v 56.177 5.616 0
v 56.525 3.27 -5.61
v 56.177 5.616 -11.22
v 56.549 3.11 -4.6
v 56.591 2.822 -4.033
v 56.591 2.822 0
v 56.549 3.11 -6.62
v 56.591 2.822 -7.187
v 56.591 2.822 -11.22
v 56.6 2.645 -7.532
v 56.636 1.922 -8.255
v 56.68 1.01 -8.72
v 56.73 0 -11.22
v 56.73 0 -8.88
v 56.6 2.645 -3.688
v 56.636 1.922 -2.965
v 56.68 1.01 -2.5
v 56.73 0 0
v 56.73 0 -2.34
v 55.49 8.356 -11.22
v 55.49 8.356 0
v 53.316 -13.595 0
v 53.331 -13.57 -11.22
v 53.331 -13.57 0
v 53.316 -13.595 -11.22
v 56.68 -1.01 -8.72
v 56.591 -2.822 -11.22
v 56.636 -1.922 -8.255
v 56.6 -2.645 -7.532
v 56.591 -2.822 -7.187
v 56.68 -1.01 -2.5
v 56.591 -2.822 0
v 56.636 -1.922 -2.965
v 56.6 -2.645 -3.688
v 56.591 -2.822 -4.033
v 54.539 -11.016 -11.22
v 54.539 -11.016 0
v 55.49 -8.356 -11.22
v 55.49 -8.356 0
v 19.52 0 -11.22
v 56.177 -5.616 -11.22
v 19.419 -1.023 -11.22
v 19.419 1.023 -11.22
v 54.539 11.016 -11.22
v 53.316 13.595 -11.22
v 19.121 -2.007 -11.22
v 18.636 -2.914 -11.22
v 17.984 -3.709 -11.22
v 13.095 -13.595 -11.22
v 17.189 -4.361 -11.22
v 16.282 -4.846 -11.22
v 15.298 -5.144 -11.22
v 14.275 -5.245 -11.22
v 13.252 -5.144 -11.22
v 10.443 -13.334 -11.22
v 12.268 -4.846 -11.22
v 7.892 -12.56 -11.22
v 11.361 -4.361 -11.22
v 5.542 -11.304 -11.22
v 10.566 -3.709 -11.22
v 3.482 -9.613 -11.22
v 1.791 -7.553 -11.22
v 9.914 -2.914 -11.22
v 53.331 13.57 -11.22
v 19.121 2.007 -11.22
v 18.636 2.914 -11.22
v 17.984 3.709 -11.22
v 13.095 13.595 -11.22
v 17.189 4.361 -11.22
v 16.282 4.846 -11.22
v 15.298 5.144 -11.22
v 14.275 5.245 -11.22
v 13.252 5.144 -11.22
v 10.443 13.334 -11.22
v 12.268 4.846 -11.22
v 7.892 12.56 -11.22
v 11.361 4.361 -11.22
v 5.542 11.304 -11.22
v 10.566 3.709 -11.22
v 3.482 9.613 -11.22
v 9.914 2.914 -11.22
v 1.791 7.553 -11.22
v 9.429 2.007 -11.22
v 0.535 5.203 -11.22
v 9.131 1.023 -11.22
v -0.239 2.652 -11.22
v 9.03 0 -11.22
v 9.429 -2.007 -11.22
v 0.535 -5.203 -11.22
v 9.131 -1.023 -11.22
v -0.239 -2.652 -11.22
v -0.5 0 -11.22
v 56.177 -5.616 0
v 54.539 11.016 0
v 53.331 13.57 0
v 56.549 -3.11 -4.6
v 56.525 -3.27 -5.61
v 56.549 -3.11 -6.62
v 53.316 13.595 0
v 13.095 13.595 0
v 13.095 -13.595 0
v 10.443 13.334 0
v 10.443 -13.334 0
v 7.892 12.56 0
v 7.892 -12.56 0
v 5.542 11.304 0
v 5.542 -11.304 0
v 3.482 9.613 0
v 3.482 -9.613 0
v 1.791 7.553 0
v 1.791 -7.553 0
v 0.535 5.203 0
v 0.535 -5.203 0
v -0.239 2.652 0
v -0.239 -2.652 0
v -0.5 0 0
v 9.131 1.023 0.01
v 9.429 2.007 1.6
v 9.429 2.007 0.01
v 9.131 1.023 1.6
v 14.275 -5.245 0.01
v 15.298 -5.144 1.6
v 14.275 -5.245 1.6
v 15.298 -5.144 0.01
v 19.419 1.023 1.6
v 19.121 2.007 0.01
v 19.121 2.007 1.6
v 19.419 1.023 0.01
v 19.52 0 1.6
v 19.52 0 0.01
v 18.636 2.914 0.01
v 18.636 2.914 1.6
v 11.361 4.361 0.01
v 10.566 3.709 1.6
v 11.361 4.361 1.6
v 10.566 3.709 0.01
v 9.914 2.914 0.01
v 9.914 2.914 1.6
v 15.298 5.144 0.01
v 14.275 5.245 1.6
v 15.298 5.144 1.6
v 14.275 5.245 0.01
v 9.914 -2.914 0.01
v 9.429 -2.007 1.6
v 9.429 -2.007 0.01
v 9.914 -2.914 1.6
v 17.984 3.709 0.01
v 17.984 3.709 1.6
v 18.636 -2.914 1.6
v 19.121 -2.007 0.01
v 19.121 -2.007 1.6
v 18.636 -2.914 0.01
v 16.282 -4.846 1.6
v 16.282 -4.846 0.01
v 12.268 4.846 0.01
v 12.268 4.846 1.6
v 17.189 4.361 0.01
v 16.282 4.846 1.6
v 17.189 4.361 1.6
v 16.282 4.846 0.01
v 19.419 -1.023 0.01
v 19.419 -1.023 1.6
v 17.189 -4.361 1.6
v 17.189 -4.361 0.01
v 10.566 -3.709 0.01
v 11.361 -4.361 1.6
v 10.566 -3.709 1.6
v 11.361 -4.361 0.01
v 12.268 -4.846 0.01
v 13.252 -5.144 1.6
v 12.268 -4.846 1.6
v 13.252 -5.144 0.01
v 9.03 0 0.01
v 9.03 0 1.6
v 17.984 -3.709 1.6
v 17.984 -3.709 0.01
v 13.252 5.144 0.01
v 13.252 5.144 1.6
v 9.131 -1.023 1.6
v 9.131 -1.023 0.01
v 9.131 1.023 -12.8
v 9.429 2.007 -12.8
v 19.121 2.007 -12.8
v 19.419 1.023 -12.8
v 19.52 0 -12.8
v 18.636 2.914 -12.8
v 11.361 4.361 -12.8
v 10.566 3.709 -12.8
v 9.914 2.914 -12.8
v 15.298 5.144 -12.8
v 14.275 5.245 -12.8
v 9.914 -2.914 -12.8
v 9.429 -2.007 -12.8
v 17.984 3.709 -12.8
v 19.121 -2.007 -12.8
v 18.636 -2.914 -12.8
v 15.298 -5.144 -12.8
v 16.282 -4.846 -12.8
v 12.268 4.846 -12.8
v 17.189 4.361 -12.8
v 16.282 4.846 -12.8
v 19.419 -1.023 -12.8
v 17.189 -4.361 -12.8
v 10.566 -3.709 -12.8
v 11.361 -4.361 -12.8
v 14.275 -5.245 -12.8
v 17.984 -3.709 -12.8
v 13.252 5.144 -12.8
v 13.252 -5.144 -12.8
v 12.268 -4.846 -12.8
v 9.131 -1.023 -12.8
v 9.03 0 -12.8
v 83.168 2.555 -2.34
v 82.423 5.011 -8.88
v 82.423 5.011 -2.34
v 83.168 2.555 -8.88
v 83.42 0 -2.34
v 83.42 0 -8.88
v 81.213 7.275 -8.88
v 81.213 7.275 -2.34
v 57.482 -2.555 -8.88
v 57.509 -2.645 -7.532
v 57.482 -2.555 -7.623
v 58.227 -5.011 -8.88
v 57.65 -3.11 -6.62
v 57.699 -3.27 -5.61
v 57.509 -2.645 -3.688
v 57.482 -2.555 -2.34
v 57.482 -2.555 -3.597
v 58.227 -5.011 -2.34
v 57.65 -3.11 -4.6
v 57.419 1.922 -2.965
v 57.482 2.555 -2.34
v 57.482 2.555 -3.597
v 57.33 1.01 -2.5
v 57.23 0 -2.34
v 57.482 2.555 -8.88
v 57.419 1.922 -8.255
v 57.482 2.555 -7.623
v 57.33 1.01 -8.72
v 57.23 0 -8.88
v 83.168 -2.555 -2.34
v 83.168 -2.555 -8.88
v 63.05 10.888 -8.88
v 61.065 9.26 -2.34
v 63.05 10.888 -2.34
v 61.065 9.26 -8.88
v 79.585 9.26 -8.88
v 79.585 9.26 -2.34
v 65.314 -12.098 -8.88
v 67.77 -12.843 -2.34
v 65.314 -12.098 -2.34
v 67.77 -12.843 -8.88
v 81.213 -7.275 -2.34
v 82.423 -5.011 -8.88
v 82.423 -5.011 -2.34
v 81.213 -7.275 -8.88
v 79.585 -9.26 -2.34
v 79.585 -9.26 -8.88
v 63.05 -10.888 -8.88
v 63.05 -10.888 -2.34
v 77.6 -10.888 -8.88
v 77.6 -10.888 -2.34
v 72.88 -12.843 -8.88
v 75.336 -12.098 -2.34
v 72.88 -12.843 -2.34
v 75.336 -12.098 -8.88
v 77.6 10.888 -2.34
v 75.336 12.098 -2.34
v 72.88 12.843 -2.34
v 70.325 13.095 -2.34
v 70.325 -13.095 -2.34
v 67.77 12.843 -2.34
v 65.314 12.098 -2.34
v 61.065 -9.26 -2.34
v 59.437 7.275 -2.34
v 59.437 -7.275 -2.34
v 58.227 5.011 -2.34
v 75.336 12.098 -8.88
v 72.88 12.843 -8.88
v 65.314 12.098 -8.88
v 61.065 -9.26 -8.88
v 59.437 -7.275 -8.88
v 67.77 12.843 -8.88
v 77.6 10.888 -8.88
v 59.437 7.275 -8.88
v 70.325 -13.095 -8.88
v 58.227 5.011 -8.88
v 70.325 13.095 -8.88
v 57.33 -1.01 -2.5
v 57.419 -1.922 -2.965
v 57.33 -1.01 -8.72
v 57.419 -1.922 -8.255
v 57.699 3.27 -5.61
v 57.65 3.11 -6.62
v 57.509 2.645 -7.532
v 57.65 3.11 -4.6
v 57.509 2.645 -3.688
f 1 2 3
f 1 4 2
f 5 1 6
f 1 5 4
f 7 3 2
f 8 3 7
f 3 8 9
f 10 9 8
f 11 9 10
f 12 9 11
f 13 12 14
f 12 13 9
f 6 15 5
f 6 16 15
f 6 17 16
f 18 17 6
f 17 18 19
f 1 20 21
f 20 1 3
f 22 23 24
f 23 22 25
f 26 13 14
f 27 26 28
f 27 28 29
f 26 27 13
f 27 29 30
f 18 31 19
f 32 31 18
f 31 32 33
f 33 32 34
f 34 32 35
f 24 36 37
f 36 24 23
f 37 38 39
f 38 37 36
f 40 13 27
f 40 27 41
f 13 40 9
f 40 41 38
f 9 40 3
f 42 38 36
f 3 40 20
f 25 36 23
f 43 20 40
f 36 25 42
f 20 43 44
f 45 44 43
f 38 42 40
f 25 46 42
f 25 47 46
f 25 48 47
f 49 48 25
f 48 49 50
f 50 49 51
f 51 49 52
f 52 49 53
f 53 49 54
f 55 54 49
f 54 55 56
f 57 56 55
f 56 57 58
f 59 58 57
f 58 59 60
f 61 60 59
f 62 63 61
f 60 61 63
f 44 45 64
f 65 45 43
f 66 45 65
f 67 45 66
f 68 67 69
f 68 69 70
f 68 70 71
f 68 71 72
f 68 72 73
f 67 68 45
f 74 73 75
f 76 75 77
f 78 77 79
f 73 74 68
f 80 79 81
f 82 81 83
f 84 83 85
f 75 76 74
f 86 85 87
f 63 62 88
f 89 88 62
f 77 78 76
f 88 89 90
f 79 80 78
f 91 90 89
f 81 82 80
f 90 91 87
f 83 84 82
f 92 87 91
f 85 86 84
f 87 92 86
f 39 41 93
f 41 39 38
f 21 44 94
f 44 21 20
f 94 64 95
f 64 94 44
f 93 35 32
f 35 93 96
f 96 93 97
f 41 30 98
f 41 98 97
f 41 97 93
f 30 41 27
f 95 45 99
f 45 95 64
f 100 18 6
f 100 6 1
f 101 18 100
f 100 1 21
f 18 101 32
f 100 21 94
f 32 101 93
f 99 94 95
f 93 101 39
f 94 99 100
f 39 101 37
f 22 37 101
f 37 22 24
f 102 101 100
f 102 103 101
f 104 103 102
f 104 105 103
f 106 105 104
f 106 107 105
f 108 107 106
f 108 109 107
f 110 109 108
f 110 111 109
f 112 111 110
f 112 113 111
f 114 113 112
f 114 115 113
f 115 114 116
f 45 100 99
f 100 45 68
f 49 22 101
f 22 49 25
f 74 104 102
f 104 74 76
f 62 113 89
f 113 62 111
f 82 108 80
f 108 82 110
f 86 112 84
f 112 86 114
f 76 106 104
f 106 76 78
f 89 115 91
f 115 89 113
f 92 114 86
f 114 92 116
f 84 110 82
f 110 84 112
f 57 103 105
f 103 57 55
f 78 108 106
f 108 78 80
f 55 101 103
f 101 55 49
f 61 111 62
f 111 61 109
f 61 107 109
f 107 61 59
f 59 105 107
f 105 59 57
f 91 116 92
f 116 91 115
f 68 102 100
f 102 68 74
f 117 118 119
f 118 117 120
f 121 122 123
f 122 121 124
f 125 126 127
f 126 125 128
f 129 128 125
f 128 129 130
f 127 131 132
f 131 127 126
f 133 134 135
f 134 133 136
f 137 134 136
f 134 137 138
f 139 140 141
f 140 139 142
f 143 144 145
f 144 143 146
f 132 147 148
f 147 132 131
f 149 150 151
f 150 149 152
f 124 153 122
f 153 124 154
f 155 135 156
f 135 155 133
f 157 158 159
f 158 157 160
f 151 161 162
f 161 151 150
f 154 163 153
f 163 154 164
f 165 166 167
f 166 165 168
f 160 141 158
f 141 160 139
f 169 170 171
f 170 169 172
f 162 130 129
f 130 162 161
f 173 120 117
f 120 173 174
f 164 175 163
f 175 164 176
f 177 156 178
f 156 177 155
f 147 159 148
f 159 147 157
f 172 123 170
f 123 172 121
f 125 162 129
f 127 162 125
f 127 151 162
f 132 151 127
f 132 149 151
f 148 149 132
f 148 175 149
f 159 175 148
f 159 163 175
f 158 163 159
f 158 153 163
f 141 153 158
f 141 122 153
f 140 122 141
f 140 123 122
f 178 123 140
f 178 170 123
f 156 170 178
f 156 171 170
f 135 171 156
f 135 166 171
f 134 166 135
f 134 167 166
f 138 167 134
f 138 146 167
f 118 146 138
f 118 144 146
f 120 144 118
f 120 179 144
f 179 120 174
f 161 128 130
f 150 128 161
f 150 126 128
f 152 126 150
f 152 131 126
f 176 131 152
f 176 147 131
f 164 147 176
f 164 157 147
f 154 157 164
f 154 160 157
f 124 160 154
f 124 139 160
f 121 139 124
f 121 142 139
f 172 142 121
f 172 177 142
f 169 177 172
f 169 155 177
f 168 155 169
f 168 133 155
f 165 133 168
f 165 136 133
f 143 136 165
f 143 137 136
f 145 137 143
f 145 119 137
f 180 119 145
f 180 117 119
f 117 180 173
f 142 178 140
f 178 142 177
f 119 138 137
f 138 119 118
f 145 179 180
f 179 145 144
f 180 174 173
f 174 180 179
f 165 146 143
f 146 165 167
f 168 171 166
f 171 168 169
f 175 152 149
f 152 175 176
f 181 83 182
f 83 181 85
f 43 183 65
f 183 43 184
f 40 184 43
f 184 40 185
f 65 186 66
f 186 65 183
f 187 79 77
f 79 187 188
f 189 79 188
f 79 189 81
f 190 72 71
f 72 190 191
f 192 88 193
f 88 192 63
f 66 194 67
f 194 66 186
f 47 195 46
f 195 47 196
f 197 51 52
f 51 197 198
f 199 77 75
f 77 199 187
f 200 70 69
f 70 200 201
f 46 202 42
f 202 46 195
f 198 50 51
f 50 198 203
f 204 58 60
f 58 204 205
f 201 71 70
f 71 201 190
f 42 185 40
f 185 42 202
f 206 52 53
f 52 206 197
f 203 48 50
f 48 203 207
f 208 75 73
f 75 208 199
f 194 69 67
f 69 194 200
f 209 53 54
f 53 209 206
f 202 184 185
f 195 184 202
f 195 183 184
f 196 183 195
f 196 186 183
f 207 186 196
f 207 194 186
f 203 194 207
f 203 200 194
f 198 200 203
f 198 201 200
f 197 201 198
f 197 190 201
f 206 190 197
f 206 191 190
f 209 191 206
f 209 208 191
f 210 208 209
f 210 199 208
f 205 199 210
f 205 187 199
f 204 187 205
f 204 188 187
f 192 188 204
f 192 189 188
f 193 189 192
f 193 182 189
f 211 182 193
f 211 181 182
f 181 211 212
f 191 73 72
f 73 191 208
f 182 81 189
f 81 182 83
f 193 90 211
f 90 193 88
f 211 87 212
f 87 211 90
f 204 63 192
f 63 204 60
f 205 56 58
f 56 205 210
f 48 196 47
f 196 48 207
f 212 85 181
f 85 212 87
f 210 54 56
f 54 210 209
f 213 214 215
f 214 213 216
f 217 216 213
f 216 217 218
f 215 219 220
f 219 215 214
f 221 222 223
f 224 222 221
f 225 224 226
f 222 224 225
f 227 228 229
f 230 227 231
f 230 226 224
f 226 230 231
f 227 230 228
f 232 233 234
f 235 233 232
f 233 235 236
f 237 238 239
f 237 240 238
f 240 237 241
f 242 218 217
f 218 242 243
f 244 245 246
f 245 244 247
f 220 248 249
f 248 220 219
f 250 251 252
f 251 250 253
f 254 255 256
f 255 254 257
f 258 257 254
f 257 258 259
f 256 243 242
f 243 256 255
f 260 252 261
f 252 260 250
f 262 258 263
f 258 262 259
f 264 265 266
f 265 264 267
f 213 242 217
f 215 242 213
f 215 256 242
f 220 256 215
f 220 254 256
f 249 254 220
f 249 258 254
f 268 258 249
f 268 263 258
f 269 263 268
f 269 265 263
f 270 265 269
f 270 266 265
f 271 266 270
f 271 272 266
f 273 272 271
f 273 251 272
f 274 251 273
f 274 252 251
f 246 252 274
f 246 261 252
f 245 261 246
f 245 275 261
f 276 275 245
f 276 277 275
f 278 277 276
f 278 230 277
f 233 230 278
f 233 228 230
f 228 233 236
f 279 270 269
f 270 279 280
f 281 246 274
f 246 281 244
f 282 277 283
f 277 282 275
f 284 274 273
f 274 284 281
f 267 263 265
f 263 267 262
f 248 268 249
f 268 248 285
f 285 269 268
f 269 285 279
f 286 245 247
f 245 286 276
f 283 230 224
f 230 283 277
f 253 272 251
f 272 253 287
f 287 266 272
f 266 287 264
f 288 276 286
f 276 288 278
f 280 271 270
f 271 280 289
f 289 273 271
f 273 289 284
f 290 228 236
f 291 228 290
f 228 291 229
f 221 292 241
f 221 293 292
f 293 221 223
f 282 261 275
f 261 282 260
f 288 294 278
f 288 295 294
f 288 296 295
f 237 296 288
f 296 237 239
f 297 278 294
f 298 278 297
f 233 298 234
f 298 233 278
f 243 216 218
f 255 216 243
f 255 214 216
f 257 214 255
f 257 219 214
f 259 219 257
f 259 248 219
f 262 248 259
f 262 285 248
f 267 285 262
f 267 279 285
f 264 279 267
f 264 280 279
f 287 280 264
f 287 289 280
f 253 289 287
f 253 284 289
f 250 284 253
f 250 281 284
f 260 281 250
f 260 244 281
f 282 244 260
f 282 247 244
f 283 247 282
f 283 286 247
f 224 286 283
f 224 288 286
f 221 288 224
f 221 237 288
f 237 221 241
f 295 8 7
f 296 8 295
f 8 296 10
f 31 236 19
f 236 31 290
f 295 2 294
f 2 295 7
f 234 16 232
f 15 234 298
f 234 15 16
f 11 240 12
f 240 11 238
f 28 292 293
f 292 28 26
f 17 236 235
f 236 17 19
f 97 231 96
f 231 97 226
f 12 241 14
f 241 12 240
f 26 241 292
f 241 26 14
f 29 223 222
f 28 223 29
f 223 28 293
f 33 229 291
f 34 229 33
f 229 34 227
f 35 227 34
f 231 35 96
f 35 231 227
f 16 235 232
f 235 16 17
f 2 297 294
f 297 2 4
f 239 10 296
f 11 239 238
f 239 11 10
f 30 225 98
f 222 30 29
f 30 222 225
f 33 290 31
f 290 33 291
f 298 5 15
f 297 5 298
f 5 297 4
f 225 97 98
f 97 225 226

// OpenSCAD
// This is a stand-in for the Blizzard Software (digipass) authenticator
// Licensed under Creative Commons: Attribution, Share-Alike
//
// For attribution you can direct people to the original file on thingiverse:
// 		http://www.thingiverse.com/thing:593551

// ================ variables

//CUSTOMIZER VARIABLES

/* [main] */

// This is used to cut holes for the LCD and button (like if you're making a "skin")
holes=0;  // [0:"false",1:"true"]

// How far the holes above extend
hole_d=20;

/* [ overall dimensions ] */

// Total height
h=26.19;

// Total width (less any keychain stuff)
w=56.23;

// Total depth
d=10.22;

// make the authenticator this much larger in all directions
// (when making a box for an authenticator, set to like 1mm or something)
oversize=1;

// How far the chord side (keyring side) extends beyond a straight rectangle
chord_w=7.7;

/* [ keychain settings] */

// Whether to cut a hole for a keyring to attach (probably always want this =true)
keyring_hole=1;  // [0:"false",1:"true"]

// Extend the keyring forward or back to make a channel for inserting it
project_keyring=10;

// How big around the keychain post is
keychain_dia=6.54;

// How far the keychain post extends beyond the authentictor body
keychain_outset=2.0;

/* [ button options ] */

// How high the button sticks up
button_d=0.59;

// How big around the button is
button_dia=9.49;

// How far the center of the button is from the button end of the device
button_inset=14.275;

// used to make cut holes for buttons on both sides in case you put it in upside down
two_buttons=1; // [0:"false",1:"true"]

/* [ LCD screen ] */

// How wide the screen is (only used if holes=true)
lcd_w=22.62;

// How high the screen is (only used if holes=true)
lcd_h=7.54;

// How far the nearest edge of the LCD is from the button end of the device (only used if holes=true)
lcd_inset=22.68;

/* [ hidden ] */

// Make a hearthstone box (only works offline with the hearthstone stl file in the same folder)
hearthstone_box=false;

// Whether to create the front or the back side of a hearthstone box
front=true;

function chord_wh_to_r(w,h)=sqrt(pow(h/2,2)+pow(w,2));

module mainbody(oversize=0){
	h_real=h+oversize;
	d_real=d+oversize;
	chord_r=chord_wh_to_r(chord_w,h)+h/2;
	union(){ // the main body
		translate([h/2,-h_real/2,-d_real]) cube([w-(h/2)-chord_w+oversize,h_real,d_real]);
		translate([h/2,0,-d_real]) cylinder(r=h_real/2,h=d+oversize,$fn=32);
		intersection(){ // the chord side
			translate([w-chord_r,0,-d_real]) cylinder(r=chord_r+(oversize/2),h=d_real,$fn=64);
			translate([h/2,-h_real/2,-d_real]) cube([w-(h/2)+oversize,h_real,d_real]);
		}
	}
}

module authenticator(oversize=0,project_keyring=0){
	mainbody(oversize);
	// the button
	translate([button_inset,0,0.01]) cylinder(r=button_dia/2+oversize/2,h=holes?hole_d:(button_d+oversize),$fn=32);
	if(two_buttons){
		translate([button_inset,0,0.01-(holes?hole_d:(button_d+oversize))-(d+oversize)]) cylinder(r=button_dia/2+oversize/2,h=holes?hole_d:(button_d+oversize),$fn=32);
	}
	if(holes){
		// the lcd
		translate([lcd_inset,-lcd_h/2,0]) cube([lcd_w,lcd_h,hole_d]);
	}
	if(keyring_hole){
		// a keyring hole
		translate([w+keychain_outset/2+h/2,0,-(d+oversize)/2 -keychain_dia/2]) cylinder(r=h/2,h=keychain_dia+project_keyring,$fn=32);
	}
	// the keychain outset
	hull(){
		translate([w,0,-(d+oversize)/2]) rotate([0,90,0]) cylinder(r=keychain_dia/2,h=keychain_outset,$fn=20);
		translate([w,0,project_keyring-(d+oversize)/2]) rotate([0,90,0]) cylinder(r=keychain_dia/2,h=keychain_outset,$fn=20);
	}
}

module box(project_keyring=0){
	difference() {
		translate([-27,85,25]) import_stl("hearthstone.STL");
		translate([0,-d/2,0]) rotate([90,0,0]) rotate([0,0,90]) authenticator(oversize,project_keyring);
	}
}

module dovetail(width=25,depth=4,angle=45,z_angle=0){
	b=depth*tan(angle);
	littlewidth=width+b*2;
	smallness=0.01;
	linear_extrude(100) rotate([0,0,z_angle]) hull() {
		// dovetail profile
		square([smallness,width]);
		translate([depth,(width-littlewidth)/2,0]) square([smallness,littlewidth]);
	}
}

module dovetailer(width=30,depth=5.101,angle=45,reverse=false,zstop=0){	
	translate([-50,0,-25]) {
		if(reverse){
			difference() {
				cube([100,100,100]);
				translate([50+width/2,-0.01,zstop]) dovetail(width,depth,angle,90);
			}
		}else{
			union() {
				cube([100,100,100]);
				translate([50-width/2,0.01,zstop]) dovetail(width,depth,angle,-90);
			}
		}
	}
}

module container(){
	if(front){
		difference(){
			box(project_keyring=0);
			dovetailer();
		}
	}else{
		intersection(){
			box(project_keyring=project_keyring);
			dovetailer();
		}
	}
}

if(hearthstone_box){
	difference() {
		container();
		translate([-50,-50,-58]) cube([100,100,50]); // flatten the bottom so it prints easier
	}
}else{
	authenticator(oversize);
}
